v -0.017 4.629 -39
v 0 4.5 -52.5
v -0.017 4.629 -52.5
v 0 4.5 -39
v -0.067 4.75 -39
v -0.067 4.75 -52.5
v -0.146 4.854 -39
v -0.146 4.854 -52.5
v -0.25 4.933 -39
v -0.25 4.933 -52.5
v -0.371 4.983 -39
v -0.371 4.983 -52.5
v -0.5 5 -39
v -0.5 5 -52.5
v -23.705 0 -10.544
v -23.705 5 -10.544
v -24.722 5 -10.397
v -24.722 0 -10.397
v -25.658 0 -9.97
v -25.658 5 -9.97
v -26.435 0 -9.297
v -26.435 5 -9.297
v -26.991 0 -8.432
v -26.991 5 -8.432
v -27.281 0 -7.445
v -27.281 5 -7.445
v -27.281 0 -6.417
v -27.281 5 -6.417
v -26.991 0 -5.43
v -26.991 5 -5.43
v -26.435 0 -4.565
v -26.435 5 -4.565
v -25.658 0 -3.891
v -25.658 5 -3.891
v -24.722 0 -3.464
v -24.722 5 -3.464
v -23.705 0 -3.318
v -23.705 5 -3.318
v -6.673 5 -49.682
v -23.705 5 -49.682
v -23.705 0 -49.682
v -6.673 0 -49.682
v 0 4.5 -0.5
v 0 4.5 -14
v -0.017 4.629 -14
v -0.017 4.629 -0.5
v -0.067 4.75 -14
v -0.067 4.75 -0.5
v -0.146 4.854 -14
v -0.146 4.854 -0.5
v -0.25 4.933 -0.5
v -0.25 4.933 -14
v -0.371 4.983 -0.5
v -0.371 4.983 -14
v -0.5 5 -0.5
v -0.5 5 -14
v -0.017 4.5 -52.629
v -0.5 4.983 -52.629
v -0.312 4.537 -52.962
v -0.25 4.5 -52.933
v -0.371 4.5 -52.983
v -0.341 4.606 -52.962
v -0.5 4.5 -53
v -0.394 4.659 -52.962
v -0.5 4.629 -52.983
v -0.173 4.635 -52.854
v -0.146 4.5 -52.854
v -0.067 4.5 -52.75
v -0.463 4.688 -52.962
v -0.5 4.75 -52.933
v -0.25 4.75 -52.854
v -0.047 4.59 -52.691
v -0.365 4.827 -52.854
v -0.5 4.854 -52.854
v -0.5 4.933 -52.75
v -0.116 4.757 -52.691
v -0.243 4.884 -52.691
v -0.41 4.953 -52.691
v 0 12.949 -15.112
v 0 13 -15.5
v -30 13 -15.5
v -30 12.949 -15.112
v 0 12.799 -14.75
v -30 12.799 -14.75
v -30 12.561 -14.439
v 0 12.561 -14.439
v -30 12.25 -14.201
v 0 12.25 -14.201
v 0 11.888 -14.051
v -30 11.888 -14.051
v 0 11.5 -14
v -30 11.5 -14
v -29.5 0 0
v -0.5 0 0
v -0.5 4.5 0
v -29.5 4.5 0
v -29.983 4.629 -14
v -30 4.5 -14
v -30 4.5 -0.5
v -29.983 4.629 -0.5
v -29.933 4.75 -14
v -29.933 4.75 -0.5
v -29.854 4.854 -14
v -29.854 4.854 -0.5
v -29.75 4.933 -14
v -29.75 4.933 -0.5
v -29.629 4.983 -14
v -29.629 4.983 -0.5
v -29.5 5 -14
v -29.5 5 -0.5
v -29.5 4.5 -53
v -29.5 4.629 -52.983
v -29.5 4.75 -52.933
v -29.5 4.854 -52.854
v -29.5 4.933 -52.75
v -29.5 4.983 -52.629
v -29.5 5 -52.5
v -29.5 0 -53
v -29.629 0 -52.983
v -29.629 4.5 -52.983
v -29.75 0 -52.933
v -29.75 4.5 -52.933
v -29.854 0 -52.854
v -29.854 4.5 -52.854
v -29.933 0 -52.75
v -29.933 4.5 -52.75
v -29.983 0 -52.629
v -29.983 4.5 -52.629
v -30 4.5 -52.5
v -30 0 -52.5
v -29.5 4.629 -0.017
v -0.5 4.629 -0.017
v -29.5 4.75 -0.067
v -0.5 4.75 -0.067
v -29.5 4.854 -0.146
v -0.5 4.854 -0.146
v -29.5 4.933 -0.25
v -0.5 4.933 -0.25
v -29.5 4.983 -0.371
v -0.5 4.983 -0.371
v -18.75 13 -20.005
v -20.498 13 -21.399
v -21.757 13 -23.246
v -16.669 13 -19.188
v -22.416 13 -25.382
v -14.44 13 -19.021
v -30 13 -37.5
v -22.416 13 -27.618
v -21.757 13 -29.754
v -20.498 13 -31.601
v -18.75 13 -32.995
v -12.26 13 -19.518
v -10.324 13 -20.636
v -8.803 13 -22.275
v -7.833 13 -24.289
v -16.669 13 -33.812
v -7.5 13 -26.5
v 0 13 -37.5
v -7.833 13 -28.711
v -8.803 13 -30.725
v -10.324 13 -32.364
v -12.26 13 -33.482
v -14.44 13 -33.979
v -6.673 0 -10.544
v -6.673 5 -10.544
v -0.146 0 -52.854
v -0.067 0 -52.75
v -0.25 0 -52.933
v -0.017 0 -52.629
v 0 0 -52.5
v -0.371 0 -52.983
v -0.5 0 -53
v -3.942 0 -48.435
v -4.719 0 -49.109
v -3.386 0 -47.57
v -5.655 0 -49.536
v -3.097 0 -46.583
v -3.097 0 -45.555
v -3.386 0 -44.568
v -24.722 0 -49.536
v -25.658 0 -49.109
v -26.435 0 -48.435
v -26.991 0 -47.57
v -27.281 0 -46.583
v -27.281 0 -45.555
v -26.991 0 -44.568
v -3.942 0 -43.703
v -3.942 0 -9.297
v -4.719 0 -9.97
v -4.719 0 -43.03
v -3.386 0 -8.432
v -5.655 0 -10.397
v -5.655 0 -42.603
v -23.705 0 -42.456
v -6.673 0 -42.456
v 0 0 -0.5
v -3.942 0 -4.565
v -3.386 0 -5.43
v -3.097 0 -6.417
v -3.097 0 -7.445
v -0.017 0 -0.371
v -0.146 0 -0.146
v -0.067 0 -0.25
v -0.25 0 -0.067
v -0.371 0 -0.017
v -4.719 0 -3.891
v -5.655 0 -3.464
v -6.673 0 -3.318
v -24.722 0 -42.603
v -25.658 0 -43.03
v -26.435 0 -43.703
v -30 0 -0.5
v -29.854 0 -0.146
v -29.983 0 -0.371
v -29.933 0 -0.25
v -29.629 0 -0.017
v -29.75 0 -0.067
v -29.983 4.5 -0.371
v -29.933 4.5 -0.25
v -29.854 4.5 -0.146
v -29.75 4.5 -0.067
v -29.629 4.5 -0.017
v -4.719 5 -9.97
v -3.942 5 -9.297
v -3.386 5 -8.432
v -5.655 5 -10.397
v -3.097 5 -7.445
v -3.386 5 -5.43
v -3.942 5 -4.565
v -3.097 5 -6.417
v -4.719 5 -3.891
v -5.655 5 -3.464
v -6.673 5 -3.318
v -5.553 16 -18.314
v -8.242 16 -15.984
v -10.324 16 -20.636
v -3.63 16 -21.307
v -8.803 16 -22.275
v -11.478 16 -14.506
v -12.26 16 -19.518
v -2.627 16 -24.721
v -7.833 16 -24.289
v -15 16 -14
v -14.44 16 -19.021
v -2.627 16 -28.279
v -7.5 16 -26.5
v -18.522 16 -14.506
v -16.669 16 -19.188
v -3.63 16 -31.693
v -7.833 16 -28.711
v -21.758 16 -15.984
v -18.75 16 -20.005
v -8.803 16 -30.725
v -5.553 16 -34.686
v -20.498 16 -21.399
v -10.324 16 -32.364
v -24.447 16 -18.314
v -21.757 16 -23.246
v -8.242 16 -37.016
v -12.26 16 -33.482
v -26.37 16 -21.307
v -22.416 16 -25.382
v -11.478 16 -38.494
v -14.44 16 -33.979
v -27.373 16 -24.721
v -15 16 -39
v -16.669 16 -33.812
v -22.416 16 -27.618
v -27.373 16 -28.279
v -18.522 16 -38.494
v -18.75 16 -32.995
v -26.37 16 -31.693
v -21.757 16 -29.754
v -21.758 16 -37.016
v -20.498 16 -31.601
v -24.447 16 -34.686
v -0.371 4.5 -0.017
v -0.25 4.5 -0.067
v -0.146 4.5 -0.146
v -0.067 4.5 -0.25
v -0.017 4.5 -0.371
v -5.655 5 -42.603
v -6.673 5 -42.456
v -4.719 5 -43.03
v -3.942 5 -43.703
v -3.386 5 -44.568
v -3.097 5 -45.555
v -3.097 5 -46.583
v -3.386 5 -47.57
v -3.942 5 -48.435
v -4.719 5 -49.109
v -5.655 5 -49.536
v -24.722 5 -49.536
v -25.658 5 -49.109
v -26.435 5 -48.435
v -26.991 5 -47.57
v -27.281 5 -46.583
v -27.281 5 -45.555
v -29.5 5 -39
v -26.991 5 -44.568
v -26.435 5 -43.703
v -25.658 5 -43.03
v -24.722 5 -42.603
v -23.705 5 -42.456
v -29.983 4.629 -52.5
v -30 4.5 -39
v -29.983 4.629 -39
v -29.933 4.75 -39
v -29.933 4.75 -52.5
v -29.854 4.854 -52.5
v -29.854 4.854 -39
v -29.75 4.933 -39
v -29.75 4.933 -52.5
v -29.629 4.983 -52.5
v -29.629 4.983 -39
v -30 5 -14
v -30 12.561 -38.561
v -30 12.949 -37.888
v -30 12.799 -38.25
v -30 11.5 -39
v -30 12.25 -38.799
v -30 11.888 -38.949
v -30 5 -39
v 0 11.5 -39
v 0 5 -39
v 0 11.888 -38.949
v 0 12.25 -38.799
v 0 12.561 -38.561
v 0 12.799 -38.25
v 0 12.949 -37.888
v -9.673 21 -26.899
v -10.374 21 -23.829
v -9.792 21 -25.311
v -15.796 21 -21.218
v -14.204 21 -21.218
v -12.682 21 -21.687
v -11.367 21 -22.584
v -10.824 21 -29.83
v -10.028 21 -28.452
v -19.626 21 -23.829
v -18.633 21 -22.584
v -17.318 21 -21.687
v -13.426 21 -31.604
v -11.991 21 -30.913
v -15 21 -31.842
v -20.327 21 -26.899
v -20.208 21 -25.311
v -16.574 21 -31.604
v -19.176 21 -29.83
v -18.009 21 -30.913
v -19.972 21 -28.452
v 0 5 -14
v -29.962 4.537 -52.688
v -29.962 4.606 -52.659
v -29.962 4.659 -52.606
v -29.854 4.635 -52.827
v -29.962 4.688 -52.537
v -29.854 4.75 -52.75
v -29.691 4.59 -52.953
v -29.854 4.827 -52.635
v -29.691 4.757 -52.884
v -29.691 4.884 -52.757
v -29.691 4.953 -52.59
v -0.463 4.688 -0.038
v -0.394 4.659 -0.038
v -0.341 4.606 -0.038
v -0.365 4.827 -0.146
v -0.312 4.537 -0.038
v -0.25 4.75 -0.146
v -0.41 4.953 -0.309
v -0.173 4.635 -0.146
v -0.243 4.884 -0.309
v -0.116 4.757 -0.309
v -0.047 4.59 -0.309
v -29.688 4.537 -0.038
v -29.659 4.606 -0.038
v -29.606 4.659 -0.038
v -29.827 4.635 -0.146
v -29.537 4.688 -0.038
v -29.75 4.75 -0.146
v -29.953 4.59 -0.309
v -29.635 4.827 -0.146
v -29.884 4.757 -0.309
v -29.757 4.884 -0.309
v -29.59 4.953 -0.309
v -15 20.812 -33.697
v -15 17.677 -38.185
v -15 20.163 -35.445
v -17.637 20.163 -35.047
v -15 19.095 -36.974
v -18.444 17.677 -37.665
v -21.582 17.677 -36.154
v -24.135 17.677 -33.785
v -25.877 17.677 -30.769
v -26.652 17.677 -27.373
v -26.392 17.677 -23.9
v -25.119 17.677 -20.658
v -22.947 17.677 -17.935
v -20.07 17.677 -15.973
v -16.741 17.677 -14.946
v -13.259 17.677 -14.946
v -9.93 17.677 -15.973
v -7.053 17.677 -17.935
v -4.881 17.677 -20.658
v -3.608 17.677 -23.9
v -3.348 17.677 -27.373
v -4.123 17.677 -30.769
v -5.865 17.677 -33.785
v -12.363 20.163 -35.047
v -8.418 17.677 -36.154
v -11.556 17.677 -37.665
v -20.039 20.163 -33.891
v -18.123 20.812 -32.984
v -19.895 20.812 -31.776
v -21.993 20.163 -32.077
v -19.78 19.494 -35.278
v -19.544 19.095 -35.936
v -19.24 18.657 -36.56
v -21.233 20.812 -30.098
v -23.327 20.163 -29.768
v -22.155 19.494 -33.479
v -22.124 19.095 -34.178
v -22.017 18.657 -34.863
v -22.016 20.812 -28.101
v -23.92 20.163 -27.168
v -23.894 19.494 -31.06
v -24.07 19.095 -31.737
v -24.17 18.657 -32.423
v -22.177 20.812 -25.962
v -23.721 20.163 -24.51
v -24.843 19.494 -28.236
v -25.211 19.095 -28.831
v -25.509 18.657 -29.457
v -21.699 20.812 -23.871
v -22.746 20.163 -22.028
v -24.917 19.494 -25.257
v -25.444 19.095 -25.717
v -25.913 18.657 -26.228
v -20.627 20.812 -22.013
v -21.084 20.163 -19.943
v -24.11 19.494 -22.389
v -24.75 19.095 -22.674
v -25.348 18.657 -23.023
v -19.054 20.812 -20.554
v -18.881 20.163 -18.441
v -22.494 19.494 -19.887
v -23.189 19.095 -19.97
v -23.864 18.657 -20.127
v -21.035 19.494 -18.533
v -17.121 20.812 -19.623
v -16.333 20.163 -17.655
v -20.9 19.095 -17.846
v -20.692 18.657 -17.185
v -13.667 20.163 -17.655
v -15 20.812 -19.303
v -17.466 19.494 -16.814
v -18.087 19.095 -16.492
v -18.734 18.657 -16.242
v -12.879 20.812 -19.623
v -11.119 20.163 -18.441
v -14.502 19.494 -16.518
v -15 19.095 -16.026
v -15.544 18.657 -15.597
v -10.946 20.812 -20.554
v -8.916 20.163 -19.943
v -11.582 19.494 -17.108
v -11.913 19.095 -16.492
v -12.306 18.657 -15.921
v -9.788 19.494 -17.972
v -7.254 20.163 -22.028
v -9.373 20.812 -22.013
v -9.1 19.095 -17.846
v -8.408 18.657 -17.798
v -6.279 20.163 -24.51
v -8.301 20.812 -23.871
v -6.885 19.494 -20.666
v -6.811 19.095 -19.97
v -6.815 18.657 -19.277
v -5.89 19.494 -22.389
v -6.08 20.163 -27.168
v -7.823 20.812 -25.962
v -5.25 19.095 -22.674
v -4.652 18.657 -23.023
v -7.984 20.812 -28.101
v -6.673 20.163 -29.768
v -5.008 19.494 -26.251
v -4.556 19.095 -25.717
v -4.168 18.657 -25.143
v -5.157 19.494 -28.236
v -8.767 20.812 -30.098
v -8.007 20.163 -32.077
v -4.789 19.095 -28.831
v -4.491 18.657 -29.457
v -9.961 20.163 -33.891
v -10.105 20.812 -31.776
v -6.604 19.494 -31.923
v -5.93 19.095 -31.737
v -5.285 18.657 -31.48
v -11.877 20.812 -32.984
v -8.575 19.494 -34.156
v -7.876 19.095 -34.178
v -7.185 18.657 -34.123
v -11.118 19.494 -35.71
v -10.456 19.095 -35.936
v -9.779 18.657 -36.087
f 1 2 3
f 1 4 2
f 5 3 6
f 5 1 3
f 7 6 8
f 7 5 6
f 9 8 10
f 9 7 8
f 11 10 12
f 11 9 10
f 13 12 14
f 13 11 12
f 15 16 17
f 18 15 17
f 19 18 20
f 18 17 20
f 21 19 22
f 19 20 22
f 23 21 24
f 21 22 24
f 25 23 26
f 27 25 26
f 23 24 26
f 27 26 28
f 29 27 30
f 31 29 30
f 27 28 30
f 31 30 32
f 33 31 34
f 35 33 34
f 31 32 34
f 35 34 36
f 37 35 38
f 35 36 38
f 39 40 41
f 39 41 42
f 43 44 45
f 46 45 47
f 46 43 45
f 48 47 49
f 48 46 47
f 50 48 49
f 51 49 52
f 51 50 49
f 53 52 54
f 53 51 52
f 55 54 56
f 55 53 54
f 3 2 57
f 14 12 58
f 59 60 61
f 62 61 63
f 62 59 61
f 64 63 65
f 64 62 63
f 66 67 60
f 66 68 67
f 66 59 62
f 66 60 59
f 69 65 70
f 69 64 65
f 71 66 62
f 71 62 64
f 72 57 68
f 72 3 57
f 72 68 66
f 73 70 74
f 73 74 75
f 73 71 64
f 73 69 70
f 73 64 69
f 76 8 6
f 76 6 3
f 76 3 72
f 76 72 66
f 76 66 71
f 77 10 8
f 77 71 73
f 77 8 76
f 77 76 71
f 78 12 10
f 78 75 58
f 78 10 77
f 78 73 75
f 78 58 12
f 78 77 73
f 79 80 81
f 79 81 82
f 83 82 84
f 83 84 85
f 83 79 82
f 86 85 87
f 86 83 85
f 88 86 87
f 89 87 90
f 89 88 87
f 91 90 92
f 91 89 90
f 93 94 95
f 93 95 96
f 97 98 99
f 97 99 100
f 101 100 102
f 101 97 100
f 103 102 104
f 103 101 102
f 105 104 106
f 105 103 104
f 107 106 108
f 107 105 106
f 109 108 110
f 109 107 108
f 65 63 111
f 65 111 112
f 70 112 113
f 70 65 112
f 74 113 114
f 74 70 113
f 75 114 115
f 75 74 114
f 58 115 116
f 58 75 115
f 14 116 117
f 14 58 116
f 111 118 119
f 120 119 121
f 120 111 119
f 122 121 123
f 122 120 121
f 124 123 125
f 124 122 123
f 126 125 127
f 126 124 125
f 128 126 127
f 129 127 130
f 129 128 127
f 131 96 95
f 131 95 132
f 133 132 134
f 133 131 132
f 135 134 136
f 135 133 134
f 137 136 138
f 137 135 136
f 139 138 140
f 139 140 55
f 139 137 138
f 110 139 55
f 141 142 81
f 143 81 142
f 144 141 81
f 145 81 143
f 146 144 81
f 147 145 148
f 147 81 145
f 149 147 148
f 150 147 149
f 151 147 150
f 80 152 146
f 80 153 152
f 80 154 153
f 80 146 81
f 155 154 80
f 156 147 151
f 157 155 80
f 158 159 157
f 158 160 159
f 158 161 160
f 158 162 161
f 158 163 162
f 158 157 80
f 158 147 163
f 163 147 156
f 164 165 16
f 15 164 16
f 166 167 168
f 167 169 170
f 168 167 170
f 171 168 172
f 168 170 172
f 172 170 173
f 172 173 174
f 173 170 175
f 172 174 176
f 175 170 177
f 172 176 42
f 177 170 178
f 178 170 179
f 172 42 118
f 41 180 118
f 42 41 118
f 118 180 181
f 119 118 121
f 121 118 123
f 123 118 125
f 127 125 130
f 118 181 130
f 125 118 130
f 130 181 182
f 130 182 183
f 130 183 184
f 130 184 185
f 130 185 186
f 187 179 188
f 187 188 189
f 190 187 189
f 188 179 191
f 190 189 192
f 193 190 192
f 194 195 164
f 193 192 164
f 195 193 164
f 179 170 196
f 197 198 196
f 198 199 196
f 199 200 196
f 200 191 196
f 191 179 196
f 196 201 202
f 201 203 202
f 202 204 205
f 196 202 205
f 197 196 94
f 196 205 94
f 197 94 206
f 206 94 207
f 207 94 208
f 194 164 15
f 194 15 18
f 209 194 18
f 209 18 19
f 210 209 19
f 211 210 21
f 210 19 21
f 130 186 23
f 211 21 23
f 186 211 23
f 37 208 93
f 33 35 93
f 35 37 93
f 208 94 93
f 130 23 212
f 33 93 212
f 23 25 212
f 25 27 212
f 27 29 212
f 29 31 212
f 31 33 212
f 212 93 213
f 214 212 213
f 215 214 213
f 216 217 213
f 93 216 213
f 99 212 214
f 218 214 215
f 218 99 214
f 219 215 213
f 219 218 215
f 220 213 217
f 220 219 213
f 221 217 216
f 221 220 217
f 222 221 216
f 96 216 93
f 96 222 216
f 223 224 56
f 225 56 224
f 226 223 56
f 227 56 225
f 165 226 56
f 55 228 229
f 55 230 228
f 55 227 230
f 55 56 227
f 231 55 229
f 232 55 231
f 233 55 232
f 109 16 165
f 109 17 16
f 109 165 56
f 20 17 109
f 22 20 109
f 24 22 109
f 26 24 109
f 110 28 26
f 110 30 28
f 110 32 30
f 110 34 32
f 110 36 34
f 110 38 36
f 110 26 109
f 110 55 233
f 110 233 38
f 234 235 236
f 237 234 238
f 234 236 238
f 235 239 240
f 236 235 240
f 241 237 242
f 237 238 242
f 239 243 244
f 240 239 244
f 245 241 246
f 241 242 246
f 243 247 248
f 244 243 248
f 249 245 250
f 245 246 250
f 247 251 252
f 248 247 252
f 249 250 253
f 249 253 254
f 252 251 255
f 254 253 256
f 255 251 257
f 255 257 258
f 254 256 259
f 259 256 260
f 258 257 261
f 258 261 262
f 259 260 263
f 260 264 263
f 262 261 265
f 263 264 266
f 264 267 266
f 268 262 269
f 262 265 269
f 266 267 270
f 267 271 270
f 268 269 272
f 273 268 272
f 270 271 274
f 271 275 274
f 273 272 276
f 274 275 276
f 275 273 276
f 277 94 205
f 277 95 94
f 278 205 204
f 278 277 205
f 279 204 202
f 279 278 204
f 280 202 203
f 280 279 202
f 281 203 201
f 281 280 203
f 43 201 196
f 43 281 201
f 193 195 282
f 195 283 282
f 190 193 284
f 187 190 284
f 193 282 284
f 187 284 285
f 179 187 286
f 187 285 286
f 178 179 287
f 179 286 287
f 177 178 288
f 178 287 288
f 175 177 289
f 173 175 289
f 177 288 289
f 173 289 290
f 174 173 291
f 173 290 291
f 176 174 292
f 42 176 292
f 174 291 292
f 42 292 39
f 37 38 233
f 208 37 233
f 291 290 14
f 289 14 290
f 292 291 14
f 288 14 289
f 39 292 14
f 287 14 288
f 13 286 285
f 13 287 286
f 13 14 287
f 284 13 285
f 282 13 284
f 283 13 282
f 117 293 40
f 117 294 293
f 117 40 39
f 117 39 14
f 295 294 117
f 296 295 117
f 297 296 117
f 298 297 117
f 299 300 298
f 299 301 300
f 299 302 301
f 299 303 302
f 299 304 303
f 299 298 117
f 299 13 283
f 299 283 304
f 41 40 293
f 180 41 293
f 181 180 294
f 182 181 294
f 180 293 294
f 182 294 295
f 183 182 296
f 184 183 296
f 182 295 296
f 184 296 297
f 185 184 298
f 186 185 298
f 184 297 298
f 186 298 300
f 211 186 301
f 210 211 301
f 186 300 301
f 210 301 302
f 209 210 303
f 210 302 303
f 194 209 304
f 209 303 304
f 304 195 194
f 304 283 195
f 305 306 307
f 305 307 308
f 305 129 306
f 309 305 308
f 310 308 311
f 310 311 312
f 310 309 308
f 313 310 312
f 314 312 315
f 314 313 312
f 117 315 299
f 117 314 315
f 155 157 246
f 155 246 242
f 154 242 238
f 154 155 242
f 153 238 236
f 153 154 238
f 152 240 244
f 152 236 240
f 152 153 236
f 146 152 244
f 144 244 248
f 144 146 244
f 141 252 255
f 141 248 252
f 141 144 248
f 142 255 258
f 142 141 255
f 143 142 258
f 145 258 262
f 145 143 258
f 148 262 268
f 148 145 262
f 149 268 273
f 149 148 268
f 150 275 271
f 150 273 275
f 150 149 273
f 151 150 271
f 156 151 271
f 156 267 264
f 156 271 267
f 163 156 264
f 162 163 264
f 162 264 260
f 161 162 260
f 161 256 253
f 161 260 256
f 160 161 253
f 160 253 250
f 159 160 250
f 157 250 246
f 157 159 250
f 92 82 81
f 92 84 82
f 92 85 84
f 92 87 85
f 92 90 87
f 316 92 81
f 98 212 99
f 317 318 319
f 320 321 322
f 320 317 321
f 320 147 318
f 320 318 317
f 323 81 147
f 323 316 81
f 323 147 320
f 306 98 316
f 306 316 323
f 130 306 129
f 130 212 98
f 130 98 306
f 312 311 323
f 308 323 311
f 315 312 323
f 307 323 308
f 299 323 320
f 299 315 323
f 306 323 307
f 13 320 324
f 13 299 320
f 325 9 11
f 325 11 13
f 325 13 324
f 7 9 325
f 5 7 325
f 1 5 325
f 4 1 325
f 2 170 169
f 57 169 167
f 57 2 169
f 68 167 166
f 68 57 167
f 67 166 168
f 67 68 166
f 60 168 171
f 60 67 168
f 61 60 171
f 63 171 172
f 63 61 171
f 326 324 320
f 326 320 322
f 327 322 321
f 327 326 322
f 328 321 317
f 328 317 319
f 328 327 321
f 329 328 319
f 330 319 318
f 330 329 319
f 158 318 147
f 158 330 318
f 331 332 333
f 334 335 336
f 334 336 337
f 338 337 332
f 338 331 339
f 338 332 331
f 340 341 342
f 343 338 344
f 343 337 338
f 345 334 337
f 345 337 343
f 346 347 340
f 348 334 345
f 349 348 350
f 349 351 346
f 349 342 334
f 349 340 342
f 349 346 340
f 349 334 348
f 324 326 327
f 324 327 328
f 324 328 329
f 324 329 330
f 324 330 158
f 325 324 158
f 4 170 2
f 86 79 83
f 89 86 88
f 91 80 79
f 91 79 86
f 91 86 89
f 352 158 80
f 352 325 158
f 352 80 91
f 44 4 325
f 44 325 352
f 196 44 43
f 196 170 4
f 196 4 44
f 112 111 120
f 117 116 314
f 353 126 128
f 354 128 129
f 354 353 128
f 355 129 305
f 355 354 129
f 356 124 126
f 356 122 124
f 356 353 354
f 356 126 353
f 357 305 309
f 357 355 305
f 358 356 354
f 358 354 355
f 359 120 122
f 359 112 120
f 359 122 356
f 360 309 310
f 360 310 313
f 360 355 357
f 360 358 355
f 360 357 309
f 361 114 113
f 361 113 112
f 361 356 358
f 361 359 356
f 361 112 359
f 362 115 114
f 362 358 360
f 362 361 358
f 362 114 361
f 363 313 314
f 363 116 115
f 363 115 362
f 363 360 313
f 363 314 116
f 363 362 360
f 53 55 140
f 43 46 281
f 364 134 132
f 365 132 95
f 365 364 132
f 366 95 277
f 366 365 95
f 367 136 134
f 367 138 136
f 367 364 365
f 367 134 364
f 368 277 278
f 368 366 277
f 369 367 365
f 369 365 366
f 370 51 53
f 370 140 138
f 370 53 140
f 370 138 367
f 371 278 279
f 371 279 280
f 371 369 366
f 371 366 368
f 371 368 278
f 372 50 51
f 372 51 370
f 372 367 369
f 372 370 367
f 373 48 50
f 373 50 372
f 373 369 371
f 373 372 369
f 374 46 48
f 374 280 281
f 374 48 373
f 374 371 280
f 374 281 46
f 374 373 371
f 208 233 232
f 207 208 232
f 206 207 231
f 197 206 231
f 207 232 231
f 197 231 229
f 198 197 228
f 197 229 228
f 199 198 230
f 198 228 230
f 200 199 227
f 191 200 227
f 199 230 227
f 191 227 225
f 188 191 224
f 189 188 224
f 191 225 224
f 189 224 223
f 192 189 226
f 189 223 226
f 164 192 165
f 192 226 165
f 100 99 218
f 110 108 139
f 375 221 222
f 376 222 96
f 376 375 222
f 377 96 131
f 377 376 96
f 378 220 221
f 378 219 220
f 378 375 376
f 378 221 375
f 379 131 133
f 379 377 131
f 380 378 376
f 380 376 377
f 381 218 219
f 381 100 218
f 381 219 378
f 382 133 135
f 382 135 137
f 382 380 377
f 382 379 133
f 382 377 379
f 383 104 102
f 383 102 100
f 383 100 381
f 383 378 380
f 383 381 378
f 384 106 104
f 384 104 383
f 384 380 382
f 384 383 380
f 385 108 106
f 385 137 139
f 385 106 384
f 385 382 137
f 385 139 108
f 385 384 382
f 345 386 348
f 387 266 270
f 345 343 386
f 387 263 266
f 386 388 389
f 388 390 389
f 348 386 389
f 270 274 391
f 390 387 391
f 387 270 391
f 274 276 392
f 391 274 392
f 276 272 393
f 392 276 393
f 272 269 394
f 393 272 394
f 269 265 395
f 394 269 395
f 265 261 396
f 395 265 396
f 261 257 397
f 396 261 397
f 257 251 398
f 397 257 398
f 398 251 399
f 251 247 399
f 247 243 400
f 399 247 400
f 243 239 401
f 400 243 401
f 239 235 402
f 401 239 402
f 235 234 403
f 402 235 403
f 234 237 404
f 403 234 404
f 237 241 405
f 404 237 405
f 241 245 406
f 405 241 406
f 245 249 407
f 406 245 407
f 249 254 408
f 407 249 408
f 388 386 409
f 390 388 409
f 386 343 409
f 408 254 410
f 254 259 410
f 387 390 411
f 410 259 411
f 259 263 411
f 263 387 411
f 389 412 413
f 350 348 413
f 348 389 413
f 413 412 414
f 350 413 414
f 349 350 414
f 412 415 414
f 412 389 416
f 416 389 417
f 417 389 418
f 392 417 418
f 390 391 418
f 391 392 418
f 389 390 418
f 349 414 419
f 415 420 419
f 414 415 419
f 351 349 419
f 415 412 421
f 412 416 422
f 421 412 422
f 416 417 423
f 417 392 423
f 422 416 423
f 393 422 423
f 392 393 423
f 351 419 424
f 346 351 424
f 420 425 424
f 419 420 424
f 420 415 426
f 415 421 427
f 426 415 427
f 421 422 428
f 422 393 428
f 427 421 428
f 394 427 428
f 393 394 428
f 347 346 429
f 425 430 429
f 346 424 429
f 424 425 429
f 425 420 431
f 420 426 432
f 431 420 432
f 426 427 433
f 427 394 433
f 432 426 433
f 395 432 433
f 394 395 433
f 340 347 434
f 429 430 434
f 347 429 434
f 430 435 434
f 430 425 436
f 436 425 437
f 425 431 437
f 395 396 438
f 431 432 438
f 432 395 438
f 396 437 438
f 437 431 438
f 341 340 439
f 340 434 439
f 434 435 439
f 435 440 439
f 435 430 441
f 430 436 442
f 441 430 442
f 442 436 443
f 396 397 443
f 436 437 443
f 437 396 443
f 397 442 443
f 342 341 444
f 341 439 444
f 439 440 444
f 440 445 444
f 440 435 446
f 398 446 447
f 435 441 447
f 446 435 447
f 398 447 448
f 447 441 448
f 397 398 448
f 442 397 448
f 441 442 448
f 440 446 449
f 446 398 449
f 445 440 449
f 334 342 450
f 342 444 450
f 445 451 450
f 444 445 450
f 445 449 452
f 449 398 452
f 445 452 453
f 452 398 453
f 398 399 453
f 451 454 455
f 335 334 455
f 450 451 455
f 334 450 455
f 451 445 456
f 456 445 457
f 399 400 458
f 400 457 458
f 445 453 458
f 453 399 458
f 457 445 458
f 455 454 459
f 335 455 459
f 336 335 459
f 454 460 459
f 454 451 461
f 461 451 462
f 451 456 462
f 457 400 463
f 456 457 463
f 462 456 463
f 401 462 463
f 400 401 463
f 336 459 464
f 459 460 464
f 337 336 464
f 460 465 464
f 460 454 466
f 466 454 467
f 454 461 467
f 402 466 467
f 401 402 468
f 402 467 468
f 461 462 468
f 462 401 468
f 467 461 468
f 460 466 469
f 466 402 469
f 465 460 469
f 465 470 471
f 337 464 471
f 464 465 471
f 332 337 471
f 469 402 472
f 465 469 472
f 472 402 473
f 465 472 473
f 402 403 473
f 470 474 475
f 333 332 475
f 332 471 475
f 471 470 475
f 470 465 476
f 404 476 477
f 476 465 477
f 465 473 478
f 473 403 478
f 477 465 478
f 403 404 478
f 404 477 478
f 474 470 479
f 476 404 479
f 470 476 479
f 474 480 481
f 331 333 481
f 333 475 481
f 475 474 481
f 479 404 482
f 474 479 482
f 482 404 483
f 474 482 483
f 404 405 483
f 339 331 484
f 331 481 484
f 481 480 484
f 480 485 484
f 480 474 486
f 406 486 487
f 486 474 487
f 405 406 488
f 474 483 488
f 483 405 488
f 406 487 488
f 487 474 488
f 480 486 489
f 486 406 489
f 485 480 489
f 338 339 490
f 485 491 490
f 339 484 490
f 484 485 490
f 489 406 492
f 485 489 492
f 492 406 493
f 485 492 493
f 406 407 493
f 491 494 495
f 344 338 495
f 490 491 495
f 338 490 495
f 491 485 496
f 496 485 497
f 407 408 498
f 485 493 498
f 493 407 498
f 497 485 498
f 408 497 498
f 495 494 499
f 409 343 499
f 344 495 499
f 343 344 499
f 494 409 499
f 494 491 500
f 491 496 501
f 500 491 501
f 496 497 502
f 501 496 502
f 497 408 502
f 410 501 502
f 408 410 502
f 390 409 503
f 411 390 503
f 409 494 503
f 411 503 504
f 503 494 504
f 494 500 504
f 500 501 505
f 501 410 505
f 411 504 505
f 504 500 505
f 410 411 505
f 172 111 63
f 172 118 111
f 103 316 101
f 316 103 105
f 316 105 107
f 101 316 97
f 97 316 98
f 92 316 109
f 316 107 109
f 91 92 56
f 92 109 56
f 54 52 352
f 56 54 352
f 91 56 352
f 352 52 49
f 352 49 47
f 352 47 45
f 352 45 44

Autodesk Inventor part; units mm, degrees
ref_plane "YZ Plane" through (0, 0, 0) normal (1, 0, 0) x (0, 1, 0)
ref_plane "XZ Plane" through (0, 0, 0) normal (0, 1, 0) x (-1, 0, 0)
sketch "Sketch1" plane through (0, 0, 0) normal (0, 1, 0) x (-1, 0, 0)
  line L0 (0, 0) -> (30, 0)
  line L1 (30, 0) -> (30, -53)
  line L2 (30, -53) -> (0, -53)
  line L3 (0, -53) -> (0, 0)
  dimension "d0" = 30
  dimension "d1" = 53
extrude "Extrusion1" add sketch "Sketch1" along normal blind 5
sketch "Sketch2" plane through (0, 5, 0) normal (0, 1, 0) x (1, 0, 0)
  line L0 (-30, 53) -> (-30, 0) projected
  line L1 (0, 53) -> (-30, 53)
  line L2 (-30, 53) -> (-30, 39)
  line L3 (-30, 39) -> (0, 39)
  line L4 (0, 39) -> (0, 53)
  line L5 (0, 0) -> (-30, 0)
  line L6 (-30, 0) -> (-30, 14)
  line L7 (-30, 14) -> (0, 14)
  line L8 (0, 14) -> (0, 0)
  line L9 (0, 39) -> (-30, 39)
  line L10 (-30, 39) -> (-30, 14)
  line L11 (-30, 14) -> (0, 14)
  line L12 (0, 14) -> (0, 39)
  dimension "d4" = 14
  dimension "d5" = 14
extrude "Extrusion2" add sketch "Sketch2" along normal blind 8 contours L3 L12 L7 L0
sketch "Sketch3" plane through (0, 13, 0) normal (0, 1, 0) x (1, 0, 0)
  circle A0 centre (-15, 26.5) radius 7.5
  point P0 (0, 0)
  dimension "d8" = 15
extrude "Extrusion3" add sketch "Sketch3" along normal blind 3
ref_plane "Work Plane1" through (-15, 0, -53) normal (-1, 0, 0) x (0, 0, 1)
sketch "Sketch4" plane through (-15, 0, -53) normal (-1, 0, 0) x (0, 0, 1)
  line L0 (19, 16) -> (26.5, 16)
  line L1 (14, 5) -> (14, 13) projected
  line L2 (39, 5) -> (39, 13) projected
  line L3 (53, 0) -> (0, 0) projected
  line L4 (53, 0) -> (53, 5) projected
  line L5 (39, 5) -> (53, 5) projected
  line L6 (39, 5) -> (39, 13) projected
  line L7 (14, 13) -> (39, 13) projected
  line L8 (14, 5) -> (14, 13) projected
  line L9 (0, 5) -> (14, 5) projected
  line L10 (0, 0) -> (0, 5) projected
  line L11 (26.5, 16) -> (14, 16)
  line L12 (26.5, 16) -> (26.5, 21)
  arc A0 (21.1584, 21) -> (14, 16) centre (20.9681, 13.6482) ccw
  line L13 (21.1584, 21) -> (26.5, 21)
revolve "Revolution1" add sketch "Sketch4" angle 360 about axis through (-15, 16, -26.5) along (0, 1, 0) contours L11 A0 L13 L12 L0
sketch "Sketch5" plane through (0, 5, 0) normal (0, 1, 0) x (1, 0, 0)
  line L0 (-6.6727, 10.5436) -> (-23.7046, 10.5436)
  line L1 (-23.7046, 3.3179) -> (-6.6727, 3.3179)
  arc A0 (-6.6727, 3.3179) -> (-6.6727, 10.5436) centre (-6.6727, 6.9307) ccw
  arc A1 (-23.7046, 10.5436) -> (-23.7046, 3.3179) centre (-23.7046, 6.9307) ccw
  line L2 (0, 14) -> (0, 39) projected
  line L3 (0, 26.5) -> (-37.5908, 26.5)
  line L4 (-6.6727, 42.4564) -> (-23.7046, 42.4564)
  line L5 (-23.7046, 49.6821) -> (-6.6727, 49.6821)
  arc A2 (-6.6727, 42.4564) -> (-6.6727, 49.6821) centre (-6.6727, 46.0693) ccw
  arc A3 (-23.7046, 49.6821) -> (-23.7046, 42.4564) centre (-23.7046, 46.0693) ccw
  point P0 (0, 0)
extrude "Extrusion4" cut sketch "Sketch5" against normal blind 32
fillet "Fillet1" radius 0.5 10 edges at (0, 5, -7) (-30, 5, -7) (-15, 5, 0) (0, 5, -46) (-15, 5, -53) (-30, 5, -46) (-30, 2.5, -53) (-30, 2.5, 0) (0, 2.5, 0) (0, 2.5, -53)
fillet "Fillet2" radius 1.5 2 edges at (-15, 13, -14) (-15, 13, -39)
properties part number "button"
